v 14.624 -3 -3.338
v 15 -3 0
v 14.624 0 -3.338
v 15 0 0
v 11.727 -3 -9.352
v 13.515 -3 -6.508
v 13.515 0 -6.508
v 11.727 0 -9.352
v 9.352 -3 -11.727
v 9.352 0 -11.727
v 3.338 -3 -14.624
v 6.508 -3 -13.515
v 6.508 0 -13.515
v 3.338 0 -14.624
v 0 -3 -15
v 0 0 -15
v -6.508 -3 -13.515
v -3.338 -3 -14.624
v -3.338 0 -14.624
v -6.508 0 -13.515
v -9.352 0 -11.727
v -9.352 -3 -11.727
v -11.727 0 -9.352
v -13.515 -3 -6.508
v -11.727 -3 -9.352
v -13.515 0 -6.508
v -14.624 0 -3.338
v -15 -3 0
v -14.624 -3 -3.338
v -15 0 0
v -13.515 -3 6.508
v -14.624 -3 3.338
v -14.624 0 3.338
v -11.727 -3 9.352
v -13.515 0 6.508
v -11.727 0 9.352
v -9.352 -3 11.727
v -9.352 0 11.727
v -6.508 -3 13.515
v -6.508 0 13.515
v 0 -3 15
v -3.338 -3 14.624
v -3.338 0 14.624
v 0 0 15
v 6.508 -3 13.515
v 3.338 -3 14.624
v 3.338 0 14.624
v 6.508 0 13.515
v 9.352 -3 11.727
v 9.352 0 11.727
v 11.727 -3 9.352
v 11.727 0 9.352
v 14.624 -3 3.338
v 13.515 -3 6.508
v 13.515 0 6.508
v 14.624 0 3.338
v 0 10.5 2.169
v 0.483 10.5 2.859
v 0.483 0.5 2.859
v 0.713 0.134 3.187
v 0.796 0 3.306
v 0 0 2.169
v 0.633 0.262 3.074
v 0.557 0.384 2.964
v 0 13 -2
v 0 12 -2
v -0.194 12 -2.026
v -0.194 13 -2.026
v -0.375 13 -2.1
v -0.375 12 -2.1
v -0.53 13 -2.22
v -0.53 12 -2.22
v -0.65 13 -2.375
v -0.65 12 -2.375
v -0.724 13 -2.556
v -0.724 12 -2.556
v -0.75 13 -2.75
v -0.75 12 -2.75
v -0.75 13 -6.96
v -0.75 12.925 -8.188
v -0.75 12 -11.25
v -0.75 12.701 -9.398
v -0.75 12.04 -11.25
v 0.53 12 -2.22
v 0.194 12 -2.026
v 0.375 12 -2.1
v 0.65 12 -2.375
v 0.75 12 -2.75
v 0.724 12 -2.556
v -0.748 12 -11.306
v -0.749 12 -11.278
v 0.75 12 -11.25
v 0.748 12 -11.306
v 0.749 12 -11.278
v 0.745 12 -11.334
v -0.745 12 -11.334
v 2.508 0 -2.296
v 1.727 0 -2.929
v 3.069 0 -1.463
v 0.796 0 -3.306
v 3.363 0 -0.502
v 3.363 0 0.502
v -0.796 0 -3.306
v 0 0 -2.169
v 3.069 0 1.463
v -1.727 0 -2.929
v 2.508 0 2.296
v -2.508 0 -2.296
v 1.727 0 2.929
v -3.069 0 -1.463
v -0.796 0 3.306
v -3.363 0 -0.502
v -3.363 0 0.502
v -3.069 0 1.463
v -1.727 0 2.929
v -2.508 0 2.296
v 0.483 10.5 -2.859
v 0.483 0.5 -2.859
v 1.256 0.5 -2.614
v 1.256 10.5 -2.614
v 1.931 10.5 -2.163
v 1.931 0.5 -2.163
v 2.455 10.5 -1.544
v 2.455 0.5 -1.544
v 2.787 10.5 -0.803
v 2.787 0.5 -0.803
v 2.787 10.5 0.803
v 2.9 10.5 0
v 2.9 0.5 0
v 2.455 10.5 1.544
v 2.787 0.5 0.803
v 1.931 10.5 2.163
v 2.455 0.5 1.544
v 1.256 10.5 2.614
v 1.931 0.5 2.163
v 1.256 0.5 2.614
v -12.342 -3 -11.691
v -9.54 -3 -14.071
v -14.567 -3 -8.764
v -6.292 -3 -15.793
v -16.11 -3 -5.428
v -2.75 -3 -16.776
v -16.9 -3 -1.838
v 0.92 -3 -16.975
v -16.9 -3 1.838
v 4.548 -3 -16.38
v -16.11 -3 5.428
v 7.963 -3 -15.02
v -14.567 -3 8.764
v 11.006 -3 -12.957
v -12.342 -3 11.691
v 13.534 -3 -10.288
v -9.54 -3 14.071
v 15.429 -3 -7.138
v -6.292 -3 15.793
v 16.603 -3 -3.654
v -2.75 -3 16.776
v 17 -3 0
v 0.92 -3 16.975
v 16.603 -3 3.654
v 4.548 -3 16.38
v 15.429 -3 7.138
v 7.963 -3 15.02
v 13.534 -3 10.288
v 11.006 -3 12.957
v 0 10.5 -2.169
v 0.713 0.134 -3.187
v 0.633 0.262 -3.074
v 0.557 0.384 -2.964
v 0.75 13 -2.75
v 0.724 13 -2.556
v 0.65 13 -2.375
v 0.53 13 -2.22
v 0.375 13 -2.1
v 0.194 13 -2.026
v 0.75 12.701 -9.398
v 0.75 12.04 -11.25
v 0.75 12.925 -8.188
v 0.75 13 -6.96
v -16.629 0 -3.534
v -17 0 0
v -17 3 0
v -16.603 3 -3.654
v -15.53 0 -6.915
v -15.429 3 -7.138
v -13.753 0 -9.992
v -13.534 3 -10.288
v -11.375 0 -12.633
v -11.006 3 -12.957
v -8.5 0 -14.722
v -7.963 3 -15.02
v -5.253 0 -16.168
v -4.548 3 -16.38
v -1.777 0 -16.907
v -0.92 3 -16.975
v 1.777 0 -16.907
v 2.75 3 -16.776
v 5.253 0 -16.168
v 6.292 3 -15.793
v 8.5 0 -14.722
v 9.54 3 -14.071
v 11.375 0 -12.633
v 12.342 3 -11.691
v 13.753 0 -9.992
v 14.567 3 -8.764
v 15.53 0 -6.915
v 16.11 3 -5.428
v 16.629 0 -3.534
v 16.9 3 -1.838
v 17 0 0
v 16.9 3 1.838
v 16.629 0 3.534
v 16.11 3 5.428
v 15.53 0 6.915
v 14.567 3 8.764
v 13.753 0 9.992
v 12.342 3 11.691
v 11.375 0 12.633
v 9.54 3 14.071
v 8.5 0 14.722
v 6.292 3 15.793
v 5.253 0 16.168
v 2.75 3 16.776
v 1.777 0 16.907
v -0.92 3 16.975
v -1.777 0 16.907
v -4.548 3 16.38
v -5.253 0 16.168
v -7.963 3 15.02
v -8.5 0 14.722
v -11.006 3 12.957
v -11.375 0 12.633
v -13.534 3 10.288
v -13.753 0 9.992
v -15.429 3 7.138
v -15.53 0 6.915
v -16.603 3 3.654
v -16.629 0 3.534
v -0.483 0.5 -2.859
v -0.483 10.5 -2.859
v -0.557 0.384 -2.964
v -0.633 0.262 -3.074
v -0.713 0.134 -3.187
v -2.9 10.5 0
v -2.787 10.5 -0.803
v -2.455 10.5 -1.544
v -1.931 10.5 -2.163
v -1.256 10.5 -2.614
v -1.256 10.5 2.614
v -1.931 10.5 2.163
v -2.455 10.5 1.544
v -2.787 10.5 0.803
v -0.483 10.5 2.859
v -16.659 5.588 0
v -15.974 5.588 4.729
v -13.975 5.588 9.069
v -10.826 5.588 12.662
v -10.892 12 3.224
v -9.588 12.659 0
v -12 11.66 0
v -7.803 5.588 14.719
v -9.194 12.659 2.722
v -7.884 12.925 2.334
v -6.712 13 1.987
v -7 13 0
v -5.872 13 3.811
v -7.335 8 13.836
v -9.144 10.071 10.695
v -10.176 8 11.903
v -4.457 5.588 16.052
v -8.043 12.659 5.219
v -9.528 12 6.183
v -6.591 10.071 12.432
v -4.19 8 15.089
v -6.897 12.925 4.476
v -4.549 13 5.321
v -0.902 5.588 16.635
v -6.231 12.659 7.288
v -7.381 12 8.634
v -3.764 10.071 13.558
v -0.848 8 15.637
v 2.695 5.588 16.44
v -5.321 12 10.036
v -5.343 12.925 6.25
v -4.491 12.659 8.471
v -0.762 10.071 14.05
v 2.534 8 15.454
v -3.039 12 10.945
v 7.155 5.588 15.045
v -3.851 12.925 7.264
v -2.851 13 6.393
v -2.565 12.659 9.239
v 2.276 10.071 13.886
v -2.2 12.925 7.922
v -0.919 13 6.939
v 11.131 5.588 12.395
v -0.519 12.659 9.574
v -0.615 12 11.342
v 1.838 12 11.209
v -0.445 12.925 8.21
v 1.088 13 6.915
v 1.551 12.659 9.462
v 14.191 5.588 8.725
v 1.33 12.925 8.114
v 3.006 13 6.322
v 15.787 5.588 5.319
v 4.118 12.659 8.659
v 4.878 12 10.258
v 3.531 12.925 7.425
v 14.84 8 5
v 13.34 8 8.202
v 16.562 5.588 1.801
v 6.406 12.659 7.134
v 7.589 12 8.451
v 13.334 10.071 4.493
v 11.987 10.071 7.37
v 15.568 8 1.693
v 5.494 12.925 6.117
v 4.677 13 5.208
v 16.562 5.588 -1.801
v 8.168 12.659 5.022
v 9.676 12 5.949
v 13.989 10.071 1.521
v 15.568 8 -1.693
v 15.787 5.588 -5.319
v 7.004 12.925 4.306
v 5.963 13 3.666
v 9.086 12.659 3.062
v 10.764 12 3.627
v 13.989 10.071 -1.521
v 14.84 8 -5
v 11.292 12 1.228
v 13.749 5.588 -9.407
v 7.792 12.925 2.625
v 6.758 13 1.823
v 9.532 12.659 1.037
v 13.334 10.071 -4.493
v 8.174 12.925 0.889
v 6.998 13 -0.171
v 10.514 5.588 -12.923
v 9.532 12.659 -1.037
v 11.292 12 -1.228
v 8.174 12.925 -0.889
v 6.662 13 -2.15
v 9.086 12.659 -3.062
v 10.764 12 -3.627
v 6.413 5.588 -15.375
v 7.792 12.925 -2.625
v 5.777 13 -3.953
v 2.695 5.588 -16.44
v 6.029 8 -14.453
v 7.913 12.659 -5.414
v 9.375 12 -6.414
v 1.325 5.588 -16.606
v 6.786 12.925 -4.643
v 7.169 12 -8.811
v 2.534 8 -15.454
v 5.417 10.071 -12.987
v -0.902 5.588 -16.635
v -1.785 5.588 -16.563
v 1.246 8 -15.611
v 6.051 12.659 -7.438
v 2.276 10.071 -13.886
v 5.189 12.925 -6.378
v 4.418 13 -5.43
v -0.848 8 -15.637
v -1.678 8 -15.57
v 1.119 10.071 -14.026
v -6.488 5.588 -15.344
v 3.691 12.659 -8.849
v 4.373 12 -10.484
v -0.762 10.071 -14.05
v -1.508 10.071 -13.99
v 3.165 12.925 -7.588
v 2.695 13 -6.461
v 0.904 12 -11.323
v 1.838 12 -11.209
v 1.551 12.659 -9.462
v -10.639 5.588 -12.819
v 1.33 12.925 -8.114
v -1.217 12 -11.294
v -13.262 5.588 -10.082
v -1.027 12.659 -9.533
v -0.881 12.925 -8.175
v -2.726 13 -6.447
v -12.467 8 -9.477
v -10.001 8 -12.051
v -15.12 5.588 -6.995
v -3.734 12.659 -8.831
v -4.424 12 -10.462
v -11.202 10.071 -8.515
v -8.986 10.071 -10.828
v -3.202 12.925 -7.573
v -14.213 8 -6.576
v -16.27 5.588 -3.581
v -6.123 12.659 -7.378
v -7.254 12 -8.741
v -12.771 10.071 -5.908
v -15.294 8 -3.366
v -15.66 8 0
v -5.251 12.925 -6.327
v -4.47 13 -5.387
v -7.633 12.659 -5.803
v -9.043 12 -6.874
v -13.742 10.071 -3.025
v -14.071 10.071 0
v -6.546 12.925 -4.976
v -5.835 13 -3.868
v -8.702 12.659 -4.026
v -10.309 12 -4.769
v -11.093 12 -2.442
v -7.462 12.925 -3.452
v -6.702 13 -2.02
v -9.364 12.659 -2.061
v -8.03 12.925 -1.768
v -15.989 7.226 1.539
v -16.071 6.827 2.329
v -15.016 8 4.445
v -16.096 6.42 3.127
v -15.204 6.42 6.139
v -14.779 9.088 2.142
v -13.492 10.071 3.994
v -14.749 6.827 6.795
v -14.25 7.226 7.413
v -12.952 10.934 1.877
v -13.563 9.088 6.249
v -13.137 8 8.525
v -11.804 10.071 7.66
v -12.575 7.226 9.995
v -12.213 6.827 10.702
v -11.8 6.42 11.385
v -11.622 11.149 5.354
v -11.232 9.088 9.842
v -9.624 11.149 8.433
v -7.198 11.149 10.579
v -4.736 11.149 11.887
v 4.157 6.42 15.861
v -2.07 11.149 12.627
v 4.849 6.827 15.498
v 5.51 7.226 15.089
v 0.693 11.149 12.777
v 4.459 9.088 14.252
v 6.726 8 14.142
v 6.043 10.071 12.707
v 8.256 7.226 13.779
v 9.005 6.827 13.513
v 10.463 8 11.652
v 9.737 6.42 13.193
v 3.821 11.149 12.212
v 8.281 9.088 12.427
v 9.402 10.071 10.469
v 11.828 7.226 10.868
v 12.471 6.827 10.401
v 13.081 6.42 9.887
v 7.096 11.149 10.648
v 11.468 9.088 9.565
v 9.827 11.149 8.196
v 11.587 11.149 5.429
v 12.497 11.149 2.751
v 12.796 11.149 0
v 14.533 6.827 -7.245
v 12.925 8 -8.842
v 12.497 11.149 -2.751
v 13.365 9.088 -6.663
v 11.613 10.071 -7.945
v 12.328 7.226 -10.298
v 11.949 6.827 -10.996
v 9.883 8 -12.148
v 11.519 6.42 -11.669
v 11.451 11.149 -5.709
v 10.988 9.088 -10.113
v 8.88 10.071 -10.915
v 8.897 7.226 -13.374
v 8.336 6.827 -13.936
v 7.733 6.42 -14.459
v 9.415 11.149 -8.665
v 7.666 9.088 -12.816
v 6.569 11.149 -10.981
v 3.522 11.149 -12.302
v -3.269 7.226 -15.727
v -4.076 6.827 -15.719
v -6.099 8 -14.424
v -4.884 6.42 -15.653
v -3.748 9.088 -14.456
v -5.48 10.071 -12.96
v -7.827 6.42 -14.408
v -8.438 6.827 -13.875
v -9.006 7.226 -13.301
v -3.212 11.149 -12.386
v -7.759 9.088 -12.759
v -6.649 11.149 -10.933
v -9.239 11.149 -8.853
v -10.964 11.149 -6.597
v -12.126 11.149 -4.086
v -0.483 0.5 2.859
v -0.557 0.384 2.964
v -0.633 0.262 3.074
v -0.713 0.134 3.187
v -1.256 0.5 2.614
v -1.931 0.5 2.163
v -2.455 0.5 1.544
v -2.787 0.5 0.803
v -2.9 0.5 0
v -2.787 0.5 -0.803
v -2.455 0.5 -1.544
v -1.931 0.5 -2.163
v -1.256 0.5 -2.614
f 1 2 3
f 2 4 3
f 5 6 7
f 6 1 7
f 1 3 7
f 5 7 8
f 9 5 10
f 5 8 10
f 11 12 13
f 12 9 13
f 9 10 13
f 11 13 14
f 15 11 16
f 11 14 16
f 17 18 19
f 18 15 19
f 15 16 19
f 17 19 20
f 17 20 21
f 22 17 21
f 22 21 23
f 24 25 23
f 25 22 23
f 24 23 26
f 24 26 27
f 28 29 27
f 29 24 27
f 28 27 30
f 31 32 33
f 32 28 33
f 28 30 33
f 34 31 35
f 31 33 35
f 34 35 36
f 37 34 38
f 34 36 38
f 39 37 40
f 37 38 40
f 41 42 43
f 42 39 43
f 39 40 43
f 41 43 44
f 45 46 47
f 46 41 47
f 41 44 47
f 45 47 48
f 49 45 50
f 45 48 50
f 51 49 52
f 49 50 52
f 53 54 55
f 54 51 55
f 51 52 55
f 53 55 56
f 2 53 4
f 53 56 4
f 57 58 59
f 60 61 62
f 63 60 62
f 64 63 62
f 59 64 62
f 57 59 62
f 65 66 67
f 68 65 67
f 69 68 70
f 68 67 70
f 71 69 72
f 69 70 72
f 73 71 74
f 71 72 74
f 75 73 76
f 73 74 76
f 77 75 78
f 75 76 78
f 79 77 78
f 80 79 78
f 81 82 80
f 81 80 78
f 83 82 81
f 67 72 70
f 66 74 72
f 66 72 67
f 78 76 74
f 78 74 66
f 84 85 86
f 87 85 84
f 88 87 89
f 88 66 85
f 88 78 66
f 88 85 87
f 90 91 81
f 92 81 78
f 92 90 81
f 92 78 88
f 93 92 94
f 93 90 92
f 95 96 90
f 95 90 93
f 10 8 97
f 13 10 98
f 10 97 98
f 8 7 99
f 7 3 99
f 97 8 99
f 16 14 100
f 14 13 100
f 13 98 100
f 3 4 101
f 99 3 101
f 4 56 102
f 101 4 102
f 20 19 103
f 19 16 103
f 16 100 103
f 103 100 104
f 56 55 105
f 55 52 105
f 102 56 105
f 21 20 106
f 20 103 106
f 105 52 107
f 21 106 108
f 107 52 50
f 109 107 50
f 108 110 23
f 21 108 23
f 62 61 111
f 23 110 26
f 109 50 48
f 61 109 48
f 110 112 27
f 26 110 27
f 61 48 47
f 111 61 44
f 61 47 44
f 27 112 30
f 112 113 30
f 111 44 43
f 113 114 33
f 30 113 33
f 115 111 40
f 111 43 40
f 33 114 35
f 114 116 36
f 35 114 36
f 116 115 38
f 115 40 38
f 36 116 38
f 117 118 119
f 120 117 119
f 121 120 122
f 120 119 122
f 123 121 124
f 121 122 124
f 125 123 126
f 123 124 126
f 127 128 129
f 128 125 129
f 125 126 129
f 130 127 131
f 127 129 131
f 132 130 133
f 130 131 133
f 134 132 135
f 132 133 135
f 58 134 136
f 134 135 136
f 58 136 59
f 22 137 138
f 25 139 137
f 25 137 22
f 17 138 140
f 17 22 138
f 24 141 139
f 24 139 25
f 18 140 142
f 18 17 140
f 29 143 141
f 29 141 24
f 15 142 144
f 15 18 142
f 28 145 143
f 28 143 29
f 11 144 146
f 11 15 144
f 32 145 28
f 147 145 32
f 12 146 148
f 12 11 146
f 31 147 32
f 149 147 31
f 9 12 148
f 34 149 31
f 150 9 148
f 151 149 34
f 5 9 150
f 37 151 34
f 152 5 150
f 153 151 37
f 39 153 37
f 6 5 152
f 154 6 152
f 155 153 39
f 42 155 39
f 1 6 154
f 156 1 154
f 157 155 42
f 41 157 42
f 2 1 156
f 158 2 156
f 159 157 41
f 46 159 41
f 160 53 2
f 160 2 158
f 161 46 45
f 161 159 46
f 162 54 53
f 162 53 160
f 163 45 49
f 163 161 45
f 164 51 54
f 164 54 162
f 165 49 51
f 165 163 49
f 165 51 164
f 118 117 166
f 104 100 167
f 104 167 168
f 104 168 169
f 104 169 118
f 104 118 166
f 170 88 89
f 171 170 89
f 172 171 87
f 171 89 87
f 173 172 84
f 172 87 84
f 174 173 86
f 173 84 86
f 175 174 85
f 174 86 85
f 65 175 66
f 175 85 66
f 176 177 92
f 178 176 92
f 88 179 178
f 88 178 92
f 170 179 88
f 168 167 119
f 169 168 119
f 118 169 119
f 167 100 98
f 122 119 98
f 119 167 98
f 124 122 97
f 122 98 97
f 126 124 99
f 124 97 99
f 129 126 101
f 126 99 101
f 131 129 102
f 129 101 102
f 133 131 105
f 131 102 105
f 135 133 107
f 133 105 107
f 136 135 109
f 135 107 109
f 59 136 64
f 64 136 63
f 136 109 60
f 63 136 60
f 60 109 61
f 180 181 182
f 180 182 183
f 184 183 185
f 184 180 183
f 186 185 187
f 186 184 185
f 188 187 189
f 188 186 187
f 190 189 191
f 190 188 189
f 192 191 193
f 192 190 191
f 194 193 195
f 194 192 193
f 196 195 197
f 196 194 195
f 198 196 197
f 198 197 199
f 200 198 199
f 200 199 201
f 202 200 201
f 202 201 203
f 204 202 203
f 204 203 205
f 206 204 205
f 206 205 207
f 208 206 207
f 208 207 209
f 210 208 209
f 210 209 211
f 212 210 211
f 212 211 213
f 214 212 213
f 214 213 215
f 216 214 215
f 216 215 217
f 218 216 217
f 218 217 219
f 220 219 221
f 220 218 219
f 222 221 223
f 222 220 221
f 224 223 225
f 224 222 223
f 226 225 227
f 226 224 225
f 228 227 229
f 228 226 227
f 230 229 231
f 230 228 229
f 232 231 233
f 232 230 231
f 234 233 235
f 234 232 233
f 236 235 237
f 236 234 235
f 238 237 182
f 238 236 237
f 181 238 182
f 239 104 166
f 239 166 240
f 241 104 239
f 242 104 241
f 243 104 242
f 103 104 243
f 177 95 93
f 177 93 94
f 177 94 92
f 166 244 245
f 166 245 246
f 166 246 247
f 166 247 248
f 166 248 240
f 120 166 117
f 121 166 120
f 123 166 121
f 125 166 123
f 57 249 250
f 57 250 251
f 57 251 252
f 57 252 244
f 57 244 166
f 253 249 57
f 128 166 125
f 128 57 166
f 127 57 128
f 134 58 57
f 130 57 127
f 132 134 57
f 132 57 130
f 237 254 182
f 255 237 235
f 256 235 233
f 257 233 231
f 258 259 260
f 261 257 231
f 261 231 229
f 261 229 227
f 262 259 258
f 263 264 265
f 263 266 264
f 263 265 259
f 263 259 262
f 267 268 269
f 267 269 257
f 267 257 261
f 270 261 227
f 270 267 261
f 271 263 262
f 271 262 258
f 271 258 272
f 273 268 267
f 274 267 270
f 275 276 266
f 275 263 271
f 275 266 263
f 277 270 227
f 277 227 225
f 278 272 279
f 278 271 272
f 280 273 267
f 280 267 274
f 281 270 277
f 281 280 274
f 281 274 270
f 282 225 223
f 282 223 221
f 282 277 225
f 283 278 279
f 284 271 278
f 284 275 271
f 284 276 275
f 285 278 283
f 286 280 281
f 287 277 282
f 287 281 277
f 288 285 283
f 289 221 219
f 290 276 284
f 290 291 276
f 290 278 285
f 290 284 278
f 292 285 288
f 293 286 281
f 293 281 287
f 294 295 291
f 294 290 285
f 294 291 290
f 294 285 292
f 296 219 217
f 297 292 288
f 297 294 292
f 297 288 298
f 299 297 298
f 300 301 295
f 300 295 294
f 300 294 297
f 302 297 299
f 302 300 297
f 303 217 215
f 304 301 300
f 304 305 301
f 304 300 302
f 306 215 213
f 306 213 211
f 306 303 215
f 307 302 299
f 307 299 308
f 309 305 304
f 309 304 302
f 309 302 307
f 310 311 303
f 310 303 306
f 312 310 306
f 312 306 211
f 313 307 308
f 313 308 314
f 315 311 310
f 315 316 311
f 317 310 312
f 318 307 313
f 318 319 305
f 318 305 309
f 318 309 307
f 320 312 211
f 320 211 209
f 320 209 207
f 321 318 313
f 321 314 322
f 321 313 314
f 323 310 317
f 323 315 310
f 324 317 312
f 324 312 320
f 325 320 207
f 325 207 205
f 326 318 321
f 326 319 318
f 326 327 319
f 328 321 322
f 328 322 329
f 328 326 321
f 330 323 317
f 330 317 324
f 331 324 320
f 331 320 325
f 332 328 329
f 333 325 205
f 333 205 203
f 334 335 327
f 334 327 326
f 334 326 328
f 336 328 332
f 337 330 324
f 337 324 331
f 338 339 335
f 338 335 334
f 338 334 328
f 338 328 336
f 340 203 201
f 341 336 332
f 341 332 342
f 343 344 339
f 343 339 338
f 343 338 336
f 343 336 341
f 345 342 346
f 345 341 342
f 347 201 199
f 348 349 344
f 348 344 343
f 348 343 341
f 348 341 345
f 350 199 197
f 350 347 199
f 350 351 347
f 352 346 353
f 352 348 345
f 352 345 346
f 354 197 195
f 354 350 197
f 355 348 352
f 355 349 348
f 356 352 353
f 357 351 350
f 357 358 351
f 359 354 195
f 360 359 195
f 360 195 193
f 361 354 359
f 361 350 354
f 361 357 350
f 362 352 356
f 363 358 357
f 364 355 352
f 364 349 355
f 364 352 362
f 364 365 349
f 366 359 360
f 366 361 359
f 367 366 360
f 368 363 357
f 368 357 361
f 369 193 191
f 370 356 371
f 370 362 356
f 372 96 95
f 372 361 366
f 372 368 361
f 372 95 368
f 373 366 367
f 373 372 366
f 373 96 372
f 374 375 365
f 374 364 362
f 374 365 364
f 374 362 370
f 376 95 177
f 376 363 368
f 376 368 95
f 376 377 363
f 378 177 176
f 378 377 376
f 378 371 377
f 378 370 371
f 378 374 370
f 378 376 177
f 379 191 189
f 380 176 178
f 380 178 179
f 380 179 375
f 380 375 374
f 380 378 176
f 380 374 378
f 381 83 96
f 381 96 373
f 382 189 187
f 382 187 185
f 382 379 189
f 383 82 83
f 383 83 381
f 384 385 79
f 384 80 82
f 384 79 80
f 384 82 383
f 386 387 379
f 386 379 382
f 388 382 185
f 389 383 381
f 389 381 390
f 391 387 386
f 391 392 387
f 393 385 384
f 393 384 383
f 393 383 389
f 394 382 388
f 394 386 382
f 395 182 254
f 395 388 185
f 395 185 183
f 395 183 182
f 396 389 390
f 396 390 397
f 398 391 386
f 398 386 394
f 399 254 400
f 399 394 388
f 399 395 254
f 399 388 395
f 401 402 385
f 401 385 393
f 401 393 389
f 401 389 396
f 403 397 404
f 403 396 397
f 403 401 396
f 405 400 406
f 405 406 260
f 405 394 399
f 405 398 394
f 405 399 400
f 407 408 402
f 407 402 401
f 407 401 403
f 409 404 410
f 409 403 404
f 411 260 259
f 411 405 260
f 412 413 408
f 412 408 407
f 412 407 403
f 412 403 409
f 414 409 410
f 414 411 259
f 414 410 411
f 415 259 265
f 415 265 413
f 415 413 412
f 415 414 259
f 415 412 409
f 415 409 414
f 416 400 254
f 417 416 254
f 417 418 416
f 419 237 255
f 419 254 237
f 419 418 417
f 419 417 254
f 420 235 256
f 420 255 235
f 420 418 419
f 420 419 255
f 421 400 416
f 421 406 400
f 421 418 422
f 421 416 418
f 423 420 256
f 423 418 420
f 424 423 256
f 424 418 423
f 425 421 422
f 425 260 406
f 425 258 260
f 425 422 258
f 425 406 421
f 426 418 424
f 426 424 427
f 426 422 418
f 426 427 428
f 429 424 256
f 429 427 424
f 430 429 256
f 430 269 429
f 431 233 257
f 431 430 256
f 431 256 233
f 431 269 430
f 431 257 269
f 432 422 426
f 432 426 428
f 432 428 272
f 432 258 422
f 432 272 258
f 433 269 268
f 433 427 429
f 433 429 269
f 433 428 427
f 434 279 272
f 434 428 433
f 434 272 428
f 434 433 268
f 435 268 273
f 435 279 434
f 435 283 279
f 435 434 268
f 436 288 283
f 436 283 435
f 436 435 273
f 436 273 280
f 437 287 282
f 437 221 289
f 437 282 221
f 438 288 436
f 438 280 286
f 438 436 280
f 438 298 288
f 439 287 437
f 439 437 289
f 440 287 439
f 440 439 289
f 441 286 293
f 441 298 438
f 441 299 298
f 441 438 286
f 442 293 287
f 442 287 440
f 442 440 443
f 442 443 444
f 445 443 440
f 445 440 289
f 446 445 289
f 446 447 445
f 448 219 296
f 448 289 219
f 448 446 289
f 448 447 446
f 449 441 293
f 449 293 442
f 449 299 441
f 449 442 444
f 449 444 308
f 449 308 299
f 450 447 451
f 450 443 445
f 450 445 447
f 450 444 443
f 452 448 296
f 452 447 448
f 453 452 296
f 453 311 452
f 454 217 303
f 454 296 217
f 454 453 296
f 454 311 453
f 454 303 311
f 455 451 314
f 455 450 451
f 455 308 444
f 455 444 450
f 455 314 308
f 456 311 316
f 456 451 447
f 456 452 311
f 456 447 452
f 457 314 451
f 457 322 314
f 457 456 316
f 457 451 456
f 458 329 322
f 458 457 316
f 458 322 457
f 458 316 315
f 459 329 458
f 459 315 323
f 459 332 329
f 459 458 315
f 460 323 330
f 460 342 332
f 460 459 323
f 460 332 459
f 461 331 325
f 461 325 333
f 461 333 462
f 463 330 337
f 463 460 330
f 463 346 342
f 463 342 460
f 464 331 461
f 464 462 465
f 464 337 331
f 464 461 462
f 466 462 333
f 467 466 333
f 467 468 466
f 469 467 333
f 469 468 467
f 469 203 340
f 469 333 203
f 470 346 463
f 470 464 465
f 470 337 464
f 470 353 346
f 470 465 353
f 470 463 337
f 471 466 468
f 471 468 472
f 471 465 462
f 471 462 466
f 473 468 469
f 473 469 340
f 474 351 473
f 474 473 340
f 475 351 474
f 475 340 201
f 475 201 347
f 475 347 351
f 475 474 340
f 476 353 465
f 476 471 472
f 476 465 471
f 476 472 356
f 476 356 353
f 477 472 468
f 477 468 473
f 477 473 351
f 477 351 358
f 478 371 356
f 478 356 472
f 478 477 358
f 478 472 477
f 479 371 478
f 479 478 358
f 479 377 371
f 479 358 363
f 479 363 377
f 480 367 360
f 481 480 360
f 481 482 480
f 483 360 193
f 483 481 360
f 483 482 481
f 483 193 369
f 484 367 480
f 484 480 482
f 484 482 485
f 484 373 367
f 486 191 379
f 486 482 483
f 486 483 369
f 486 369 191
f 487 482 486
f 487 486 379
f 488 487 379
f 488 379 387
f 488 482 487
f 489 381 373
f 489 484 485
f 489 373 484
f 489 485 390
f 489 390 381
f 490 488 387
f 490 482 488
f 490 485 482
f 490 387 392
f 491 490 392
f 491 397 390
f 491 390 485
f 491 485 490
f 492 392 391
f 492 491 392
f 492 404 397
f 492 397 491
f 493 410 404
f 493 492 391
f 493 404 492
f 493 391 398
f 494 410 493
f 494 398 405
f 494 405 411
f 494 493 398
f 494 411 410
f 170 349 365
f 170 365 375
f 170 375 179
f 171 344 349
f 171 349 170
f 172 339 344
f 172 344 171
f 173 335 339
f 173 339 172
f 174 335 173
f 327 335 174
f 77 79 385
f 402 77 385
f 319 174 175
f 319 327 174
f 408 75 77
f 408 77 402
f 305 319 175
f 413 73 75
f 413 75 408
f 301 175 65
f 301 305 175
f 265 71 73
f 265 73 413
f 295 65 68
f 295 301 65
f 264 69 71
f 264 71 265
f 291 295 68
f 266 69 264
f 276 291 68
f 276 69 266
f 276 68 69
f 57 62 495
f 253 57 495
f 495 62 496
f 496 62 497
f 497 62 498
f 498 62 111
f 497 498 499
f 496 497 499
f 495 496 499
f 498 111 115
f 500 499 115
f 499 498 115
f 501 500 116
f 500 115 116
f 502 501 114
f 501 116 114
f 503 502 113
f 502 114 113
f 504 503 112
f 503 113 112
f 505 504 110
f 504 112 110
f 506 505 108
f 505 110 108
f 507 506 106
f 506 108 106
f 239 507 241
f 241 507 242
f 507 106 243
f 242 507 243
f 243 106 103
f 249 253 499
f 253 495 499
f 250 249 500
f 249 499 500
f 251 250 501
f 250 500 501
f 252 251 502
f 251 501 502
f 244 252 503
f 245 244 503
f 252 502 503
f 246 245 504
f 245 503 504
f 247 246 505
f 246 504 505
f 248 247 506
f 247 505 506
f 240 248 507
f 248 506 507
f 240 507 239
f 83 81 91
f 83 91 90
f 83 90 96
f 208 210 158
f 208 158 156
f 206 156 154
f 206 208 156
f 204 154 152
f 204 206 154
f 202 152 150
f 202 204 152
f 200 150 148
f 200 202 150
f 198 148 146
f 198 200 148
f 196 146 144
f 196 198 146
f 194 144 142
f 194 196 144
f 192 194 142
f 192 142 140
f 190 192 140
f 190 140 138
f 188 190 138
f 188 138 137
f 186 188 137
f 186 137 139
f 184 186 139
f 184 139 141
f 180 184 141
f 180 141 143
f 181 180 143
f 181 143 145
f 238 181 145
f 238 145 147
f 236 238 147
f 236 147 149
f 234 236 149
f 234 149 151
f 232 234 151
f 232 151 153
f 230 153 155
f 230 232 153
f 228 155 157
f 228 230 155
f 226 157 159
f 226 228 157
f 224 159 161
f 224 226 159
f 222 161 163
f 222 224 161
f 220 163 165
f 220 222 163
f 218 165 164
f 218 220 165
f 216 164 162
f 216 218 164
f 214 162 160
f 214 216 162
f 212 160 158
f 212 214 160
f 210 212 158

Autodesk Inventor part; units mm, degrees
ref_plane "YZ Plane" through (0, 0, 0) normal (1, 0, 0) x (0, 1, 0)
ref_plane "XZ Plane" through (0, 0, 0) normal (0, 1, 0) x (-1, 0, 0)
ref_plane "XY Plane" through (0, 0, 0) normal (0, 0, 1) x (1, 0, 0)
sketch "Sketch1" plane through (0, 0, 0) normal (0, 1, 0) x (-1, 0, 0)
  circle A0 centre (0, 0) radius 17
  dimension "d0" = 34
extrude "Extrusion1" add sketch "Sketch1" along normal blind 13
chamfer "Chamfer1" distance 4 angle 45 1 edges at (17, 13, 0)
sketch "Sketch2" plane through (0, 13, 0) normal (0, 1, 0) x (1, 0, 0)
  line L0 (0.75, 2) -> (-0.75, 2)
  line L1 (-0.75, 2) -> (-0.75, 12)
  line L2 (-0.75, 12) -> (0.75, 12)
  line L3 (0.75, 12) -> (0.75, 2)
  circle A0 centre (0, 0) radius 17 projected
  dimension "d6" = 1.5
  dimension "d7" = 10
  dimension "d8" = 2
  dimension "d9" = 16.25
extrude "Extrusion2" cut sketch "Sketch2" against normal blind 1 contours L0 L1 L2 L3
fillet "Fillet1" radius 0.75 4 edges at (0.75, 12.5, -12) (-0.75, 12.5, -12) (-0.75, 12.5, -2) (0.75, 12.5, -2)
sketch "Sketch3" plane through (0, 0, 0) normal (0, -1, 0) x (1, 0, 0)
  circle A0 centre (0, 0) radius 2.9
  line L0 (0, 0) -> (3.3833, 0) construction
  line L1 (0, 0) -> (3.3833, 0) construction
  line L2 (0, 0) -> (2.9, 0) construction
  line L3 (0, 0) -> (2.9, 0) construction
  line L4 (0, 0) -> (2.9, 0) construction
  line L5 (0, 0) -> (-0.4833, -2.8594)
  line L6 (0, 0) -> (2.9, 0) construction
  line L7 (-0.4833, -2.8594) -> (0.4833, -2.8594)
  line L8 (0, 0) -> (-0.4833, 2.8594)
  line L9 (0, 0) -> (2.9, 0) construction
  line L10 (-0.4833, 2.8594) -> (0.4833, 2.8594)
  line L11 (0.4833, 2.8594) -> (1.1703, 2.8594) construction
  line L12 (0.4833, 2.8594) -> (0, 2.1692)
  line L13 (0.4833, 2.8594) -> (1.326, 2.8594) construction
  line L14 (0, 2.1692) -> (-0.4833, 2.8594)
  line L15 (0.4833, -2.8594) -> (0, -2.1692)
  line L16 (0.4833, -2.8594) -> (1.326, -2.8594) construction
  line L17 (0, -2.1692) -> (-0.4833, -2.8594)
  dimension "d13" = 5.8
  dimension "d50" = 99.594
  dimension "d52" = 99.594
  dimension "d54" = 125
  dimension "d55" = 125
extrude "Extrusion7" cut sketch "Sketch3" against normal blind 10.5 contours A0 L15 L17 L5 L8 L14 L12 | L8 L5 A0
sketch "Sketch5" plane through (0, 0, 0) normal (0, -1, 0) x (1, 0, 0)
  circle A0 centre (0, 0) radius 17
  circle A1 centre (0, 0) radius 15
extrude "Extrusion8" add sketch "Sketch5" along normal blind 3
chamfer "Chamfer2" distance 0.5 angle 45 2 edges at (-2.9, 0, 0) (2.9, 0, 0)
fillet "Fillet6" radius 10 2 edges at (13, 13, 0) (17, 9, 0)
properties part number "knob"
